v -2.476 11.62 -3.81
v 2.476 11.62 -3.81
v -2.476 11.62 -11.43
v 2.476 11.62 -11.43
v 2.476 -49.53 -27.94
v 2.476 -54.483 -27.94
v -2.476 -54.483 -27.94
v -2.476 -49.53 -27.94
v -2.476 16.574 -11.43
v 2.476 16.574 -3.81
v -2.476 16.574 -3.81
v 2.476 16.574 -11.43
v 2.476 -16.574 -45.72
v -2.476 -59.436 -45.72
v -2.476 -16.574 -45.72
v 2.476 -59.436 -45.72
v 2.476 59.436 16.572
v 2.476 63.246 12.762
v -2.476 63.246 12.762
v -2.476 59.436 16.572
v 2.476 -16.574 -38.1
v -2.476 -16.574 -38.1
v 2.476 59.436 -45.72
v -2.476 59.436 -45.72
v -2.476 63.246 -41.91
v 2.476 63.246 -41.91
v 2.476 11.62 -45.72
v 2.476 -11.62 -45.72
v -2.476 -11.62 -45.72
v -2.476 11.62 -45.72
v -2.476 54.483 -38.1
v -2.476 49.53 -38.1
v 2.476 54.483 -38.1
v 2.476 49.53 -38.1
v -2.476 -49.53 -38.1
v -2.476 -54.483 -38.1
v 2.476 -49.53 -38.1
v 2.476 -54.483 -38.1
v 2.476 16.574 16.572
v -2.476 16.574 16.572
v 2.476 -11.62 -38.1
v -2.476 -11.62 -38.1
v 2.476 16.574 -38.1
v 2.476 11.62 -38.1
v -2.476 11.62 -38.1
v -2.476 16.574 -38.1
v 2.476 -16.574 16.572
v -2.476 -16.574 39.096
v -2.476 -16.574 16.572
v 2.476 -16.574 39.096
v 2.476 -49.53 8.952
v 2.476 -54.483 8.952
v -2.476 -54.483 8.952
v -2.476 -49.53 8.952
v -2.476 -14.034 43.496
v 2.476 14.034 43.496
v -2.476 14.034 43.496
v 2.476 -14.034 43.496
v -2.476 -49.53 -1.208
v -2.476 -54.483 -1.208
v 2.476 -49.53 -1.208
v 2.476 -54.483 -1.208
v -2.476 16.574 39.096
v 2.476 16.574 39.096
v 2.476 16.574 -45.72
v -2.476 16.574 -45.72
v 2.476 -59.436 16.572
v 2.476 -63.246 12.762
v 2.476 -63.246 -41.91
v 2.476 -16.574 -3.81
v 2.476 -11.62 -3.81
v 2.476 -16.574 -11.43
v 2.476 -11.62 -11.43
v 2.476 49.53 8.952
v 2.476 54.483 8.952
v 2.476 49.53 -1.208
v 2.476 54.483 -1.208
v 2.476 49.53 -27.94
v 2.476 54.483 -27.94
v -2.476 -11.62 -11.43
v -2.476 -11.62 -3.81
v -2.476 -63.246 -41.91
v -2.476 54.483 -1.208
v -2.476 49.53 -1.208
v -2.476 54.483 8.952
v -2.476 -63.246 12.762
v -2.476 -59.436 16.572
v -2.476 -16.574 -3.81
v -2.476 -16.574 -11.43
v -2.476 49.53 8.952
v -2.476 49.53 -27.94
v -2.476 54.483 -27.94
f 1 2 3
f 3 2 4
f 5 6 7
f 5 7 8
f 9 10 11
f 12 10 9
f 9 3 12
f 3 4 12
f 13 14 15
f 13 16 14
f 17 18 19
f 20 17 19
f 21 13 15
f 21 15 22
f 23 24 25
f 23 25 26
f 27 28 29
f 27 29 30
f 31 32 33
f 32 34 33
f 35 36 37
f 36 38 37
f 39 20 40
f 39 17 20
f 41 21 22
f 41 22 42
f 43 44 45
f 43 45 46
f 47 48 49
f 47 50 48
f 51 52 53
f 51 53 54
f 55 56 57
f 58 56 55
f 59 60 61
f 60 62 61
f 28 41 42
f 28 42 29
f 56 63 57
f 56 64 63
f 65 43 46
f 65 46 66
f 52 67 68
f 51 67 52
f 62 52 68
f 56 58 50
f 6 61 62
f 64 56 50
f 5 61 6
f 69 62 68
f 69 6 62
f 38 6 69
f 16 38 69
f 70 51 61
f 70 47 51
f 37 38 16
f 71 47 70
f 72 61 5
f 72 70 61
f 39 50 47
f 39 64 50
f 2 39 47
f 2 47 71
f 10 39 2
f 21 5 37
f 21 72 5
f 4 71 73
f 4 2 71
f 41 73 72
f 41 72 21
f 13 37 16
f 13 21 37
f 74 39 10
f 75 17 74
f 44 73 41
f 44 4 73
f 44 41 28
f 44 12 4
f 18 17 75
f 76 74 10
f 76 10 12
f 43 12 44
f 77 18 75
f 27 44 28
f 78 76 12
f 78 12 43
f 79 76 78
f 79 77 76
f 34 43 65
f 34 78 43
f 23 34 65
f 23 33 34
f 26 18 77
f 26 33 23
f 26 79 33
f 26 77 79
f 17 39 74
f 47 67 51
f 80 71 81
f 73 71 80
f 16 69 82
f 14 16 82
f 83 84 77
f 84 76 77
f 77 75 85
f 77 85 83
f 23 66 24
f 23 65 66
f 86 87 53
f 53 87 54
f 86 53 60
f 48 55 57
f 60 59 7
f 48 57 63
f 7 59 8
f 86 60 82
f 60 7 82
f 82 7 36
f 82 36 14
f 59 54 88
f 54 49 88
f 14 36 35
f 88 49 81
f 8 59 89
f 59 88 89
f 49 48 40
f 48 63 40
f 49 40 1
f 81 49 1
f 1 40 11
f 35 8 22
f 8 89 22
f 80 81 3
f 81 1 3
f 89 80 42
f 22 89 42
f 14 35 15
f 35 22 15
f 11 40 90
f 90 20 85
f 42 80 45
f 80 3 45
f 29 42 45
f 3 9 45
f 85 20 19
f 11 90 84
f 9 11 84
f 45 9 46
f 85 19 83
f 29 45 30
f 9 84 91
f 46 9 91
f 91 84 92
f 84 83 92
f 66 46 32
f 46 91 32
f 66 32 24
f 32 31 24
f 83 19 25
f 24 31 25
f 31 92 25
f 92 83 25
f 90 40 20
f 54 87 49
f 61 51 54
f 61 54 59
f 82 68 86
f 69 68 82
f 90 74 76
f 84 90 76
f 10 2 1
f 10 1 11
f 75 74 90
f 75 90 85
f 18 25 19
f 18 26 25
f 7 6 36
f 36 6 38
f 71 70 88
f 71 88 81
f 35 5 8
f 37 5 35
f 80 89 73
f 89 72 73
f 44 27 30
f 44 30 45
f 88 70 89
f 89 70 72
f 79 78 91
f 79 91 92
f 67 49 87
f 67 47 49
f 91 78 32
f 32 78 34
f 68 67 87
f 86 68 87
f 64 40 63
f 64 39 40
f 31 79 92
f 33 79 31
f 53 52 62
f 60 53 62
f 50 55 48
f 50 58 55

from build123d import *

# Parameters (mm, degrees)
SKETCH1_W           = 10.16
SKETCH1_H           = 4.953
SKETCH1_W_2         = 7.62
BOSS_EXTRUDE1_DEPTH = 2.4765
CHAMFER2_SIZE       = 3.81


with BuildPart() as part:
    # Sketch1 → Boss-Extrude1 (new body, symmetric)
    with BuildSketch(Plane(origin=(0, 0, 0), x_dir=(0, 0, -1), z_dir=(1, 0, 0))):
        Polygon((45.72, -63.246), (45.72, -16.5735), (38.1, -16.5735), (38.1, -11.6205), (45.72, -11.6205), (45.72, 11.6205), (38.1, 11.6205), (38.1, 16.5735), (45.72, 16.5735), (45.72, 63.246), (-16.571856626, 63.246), (-16.571856626, 16.5735), (-39.096447575, 16.5735), (-43.495856626, 14.0335), (-43.495856626, -14.0335), (-39.096447575, -16.5735), (-16.571856626, -16.5735), (-16.571856626, -63.246), align=None)
        with Locations((33.02, -52.0065)):
            Rectangle(SKETCH1_W, SKETCH1_H, mode=Mode.SUBTRACT)
        with Locations((33.02, 52.0065)):
            Rectangle(SKETCH1_W, SKETCH1_H, mode=Mode.SUBTRACT)
        with Locations((-3.871856626, 52.0065)):
            Rectangle(SKETCH1_W, SKETCH1_H, mode=Mode.SUBTRACT)
        with Locations((-3.871856626, -52.0065)):
            Rectangle(SKETCH1_W, SKETCH1_H, mode=Mode.SUBTRACT)
        with Locations((7.62, 14.097)):
            Rectangle(SKETCH1_W_2, SKETCH1_H, mode=Mode.SUBTRACT)
        with Locations((7.62, -14.097)):
            Rectangle(SKETCH1_W_2, SKETCH1_H, mode=Mode.SUBTRACT)
    extrude(amount=BOSS_EXTRUDE1_DEPTH, both=True)

    # Chamfer2
    chamfer2_edges = [part.edges().sort_by_distance(p)[0] for p in [
        (0, -63.246, -45.72),
        (0, -63.246, 16.571856626),
        (0, 63.246, 16.571856626),
        (0, 63.246, -45.72),
    ]]
    chamfer(chamfer2_edges, length=CHAMFER2_SIZE)


solid = part.part
